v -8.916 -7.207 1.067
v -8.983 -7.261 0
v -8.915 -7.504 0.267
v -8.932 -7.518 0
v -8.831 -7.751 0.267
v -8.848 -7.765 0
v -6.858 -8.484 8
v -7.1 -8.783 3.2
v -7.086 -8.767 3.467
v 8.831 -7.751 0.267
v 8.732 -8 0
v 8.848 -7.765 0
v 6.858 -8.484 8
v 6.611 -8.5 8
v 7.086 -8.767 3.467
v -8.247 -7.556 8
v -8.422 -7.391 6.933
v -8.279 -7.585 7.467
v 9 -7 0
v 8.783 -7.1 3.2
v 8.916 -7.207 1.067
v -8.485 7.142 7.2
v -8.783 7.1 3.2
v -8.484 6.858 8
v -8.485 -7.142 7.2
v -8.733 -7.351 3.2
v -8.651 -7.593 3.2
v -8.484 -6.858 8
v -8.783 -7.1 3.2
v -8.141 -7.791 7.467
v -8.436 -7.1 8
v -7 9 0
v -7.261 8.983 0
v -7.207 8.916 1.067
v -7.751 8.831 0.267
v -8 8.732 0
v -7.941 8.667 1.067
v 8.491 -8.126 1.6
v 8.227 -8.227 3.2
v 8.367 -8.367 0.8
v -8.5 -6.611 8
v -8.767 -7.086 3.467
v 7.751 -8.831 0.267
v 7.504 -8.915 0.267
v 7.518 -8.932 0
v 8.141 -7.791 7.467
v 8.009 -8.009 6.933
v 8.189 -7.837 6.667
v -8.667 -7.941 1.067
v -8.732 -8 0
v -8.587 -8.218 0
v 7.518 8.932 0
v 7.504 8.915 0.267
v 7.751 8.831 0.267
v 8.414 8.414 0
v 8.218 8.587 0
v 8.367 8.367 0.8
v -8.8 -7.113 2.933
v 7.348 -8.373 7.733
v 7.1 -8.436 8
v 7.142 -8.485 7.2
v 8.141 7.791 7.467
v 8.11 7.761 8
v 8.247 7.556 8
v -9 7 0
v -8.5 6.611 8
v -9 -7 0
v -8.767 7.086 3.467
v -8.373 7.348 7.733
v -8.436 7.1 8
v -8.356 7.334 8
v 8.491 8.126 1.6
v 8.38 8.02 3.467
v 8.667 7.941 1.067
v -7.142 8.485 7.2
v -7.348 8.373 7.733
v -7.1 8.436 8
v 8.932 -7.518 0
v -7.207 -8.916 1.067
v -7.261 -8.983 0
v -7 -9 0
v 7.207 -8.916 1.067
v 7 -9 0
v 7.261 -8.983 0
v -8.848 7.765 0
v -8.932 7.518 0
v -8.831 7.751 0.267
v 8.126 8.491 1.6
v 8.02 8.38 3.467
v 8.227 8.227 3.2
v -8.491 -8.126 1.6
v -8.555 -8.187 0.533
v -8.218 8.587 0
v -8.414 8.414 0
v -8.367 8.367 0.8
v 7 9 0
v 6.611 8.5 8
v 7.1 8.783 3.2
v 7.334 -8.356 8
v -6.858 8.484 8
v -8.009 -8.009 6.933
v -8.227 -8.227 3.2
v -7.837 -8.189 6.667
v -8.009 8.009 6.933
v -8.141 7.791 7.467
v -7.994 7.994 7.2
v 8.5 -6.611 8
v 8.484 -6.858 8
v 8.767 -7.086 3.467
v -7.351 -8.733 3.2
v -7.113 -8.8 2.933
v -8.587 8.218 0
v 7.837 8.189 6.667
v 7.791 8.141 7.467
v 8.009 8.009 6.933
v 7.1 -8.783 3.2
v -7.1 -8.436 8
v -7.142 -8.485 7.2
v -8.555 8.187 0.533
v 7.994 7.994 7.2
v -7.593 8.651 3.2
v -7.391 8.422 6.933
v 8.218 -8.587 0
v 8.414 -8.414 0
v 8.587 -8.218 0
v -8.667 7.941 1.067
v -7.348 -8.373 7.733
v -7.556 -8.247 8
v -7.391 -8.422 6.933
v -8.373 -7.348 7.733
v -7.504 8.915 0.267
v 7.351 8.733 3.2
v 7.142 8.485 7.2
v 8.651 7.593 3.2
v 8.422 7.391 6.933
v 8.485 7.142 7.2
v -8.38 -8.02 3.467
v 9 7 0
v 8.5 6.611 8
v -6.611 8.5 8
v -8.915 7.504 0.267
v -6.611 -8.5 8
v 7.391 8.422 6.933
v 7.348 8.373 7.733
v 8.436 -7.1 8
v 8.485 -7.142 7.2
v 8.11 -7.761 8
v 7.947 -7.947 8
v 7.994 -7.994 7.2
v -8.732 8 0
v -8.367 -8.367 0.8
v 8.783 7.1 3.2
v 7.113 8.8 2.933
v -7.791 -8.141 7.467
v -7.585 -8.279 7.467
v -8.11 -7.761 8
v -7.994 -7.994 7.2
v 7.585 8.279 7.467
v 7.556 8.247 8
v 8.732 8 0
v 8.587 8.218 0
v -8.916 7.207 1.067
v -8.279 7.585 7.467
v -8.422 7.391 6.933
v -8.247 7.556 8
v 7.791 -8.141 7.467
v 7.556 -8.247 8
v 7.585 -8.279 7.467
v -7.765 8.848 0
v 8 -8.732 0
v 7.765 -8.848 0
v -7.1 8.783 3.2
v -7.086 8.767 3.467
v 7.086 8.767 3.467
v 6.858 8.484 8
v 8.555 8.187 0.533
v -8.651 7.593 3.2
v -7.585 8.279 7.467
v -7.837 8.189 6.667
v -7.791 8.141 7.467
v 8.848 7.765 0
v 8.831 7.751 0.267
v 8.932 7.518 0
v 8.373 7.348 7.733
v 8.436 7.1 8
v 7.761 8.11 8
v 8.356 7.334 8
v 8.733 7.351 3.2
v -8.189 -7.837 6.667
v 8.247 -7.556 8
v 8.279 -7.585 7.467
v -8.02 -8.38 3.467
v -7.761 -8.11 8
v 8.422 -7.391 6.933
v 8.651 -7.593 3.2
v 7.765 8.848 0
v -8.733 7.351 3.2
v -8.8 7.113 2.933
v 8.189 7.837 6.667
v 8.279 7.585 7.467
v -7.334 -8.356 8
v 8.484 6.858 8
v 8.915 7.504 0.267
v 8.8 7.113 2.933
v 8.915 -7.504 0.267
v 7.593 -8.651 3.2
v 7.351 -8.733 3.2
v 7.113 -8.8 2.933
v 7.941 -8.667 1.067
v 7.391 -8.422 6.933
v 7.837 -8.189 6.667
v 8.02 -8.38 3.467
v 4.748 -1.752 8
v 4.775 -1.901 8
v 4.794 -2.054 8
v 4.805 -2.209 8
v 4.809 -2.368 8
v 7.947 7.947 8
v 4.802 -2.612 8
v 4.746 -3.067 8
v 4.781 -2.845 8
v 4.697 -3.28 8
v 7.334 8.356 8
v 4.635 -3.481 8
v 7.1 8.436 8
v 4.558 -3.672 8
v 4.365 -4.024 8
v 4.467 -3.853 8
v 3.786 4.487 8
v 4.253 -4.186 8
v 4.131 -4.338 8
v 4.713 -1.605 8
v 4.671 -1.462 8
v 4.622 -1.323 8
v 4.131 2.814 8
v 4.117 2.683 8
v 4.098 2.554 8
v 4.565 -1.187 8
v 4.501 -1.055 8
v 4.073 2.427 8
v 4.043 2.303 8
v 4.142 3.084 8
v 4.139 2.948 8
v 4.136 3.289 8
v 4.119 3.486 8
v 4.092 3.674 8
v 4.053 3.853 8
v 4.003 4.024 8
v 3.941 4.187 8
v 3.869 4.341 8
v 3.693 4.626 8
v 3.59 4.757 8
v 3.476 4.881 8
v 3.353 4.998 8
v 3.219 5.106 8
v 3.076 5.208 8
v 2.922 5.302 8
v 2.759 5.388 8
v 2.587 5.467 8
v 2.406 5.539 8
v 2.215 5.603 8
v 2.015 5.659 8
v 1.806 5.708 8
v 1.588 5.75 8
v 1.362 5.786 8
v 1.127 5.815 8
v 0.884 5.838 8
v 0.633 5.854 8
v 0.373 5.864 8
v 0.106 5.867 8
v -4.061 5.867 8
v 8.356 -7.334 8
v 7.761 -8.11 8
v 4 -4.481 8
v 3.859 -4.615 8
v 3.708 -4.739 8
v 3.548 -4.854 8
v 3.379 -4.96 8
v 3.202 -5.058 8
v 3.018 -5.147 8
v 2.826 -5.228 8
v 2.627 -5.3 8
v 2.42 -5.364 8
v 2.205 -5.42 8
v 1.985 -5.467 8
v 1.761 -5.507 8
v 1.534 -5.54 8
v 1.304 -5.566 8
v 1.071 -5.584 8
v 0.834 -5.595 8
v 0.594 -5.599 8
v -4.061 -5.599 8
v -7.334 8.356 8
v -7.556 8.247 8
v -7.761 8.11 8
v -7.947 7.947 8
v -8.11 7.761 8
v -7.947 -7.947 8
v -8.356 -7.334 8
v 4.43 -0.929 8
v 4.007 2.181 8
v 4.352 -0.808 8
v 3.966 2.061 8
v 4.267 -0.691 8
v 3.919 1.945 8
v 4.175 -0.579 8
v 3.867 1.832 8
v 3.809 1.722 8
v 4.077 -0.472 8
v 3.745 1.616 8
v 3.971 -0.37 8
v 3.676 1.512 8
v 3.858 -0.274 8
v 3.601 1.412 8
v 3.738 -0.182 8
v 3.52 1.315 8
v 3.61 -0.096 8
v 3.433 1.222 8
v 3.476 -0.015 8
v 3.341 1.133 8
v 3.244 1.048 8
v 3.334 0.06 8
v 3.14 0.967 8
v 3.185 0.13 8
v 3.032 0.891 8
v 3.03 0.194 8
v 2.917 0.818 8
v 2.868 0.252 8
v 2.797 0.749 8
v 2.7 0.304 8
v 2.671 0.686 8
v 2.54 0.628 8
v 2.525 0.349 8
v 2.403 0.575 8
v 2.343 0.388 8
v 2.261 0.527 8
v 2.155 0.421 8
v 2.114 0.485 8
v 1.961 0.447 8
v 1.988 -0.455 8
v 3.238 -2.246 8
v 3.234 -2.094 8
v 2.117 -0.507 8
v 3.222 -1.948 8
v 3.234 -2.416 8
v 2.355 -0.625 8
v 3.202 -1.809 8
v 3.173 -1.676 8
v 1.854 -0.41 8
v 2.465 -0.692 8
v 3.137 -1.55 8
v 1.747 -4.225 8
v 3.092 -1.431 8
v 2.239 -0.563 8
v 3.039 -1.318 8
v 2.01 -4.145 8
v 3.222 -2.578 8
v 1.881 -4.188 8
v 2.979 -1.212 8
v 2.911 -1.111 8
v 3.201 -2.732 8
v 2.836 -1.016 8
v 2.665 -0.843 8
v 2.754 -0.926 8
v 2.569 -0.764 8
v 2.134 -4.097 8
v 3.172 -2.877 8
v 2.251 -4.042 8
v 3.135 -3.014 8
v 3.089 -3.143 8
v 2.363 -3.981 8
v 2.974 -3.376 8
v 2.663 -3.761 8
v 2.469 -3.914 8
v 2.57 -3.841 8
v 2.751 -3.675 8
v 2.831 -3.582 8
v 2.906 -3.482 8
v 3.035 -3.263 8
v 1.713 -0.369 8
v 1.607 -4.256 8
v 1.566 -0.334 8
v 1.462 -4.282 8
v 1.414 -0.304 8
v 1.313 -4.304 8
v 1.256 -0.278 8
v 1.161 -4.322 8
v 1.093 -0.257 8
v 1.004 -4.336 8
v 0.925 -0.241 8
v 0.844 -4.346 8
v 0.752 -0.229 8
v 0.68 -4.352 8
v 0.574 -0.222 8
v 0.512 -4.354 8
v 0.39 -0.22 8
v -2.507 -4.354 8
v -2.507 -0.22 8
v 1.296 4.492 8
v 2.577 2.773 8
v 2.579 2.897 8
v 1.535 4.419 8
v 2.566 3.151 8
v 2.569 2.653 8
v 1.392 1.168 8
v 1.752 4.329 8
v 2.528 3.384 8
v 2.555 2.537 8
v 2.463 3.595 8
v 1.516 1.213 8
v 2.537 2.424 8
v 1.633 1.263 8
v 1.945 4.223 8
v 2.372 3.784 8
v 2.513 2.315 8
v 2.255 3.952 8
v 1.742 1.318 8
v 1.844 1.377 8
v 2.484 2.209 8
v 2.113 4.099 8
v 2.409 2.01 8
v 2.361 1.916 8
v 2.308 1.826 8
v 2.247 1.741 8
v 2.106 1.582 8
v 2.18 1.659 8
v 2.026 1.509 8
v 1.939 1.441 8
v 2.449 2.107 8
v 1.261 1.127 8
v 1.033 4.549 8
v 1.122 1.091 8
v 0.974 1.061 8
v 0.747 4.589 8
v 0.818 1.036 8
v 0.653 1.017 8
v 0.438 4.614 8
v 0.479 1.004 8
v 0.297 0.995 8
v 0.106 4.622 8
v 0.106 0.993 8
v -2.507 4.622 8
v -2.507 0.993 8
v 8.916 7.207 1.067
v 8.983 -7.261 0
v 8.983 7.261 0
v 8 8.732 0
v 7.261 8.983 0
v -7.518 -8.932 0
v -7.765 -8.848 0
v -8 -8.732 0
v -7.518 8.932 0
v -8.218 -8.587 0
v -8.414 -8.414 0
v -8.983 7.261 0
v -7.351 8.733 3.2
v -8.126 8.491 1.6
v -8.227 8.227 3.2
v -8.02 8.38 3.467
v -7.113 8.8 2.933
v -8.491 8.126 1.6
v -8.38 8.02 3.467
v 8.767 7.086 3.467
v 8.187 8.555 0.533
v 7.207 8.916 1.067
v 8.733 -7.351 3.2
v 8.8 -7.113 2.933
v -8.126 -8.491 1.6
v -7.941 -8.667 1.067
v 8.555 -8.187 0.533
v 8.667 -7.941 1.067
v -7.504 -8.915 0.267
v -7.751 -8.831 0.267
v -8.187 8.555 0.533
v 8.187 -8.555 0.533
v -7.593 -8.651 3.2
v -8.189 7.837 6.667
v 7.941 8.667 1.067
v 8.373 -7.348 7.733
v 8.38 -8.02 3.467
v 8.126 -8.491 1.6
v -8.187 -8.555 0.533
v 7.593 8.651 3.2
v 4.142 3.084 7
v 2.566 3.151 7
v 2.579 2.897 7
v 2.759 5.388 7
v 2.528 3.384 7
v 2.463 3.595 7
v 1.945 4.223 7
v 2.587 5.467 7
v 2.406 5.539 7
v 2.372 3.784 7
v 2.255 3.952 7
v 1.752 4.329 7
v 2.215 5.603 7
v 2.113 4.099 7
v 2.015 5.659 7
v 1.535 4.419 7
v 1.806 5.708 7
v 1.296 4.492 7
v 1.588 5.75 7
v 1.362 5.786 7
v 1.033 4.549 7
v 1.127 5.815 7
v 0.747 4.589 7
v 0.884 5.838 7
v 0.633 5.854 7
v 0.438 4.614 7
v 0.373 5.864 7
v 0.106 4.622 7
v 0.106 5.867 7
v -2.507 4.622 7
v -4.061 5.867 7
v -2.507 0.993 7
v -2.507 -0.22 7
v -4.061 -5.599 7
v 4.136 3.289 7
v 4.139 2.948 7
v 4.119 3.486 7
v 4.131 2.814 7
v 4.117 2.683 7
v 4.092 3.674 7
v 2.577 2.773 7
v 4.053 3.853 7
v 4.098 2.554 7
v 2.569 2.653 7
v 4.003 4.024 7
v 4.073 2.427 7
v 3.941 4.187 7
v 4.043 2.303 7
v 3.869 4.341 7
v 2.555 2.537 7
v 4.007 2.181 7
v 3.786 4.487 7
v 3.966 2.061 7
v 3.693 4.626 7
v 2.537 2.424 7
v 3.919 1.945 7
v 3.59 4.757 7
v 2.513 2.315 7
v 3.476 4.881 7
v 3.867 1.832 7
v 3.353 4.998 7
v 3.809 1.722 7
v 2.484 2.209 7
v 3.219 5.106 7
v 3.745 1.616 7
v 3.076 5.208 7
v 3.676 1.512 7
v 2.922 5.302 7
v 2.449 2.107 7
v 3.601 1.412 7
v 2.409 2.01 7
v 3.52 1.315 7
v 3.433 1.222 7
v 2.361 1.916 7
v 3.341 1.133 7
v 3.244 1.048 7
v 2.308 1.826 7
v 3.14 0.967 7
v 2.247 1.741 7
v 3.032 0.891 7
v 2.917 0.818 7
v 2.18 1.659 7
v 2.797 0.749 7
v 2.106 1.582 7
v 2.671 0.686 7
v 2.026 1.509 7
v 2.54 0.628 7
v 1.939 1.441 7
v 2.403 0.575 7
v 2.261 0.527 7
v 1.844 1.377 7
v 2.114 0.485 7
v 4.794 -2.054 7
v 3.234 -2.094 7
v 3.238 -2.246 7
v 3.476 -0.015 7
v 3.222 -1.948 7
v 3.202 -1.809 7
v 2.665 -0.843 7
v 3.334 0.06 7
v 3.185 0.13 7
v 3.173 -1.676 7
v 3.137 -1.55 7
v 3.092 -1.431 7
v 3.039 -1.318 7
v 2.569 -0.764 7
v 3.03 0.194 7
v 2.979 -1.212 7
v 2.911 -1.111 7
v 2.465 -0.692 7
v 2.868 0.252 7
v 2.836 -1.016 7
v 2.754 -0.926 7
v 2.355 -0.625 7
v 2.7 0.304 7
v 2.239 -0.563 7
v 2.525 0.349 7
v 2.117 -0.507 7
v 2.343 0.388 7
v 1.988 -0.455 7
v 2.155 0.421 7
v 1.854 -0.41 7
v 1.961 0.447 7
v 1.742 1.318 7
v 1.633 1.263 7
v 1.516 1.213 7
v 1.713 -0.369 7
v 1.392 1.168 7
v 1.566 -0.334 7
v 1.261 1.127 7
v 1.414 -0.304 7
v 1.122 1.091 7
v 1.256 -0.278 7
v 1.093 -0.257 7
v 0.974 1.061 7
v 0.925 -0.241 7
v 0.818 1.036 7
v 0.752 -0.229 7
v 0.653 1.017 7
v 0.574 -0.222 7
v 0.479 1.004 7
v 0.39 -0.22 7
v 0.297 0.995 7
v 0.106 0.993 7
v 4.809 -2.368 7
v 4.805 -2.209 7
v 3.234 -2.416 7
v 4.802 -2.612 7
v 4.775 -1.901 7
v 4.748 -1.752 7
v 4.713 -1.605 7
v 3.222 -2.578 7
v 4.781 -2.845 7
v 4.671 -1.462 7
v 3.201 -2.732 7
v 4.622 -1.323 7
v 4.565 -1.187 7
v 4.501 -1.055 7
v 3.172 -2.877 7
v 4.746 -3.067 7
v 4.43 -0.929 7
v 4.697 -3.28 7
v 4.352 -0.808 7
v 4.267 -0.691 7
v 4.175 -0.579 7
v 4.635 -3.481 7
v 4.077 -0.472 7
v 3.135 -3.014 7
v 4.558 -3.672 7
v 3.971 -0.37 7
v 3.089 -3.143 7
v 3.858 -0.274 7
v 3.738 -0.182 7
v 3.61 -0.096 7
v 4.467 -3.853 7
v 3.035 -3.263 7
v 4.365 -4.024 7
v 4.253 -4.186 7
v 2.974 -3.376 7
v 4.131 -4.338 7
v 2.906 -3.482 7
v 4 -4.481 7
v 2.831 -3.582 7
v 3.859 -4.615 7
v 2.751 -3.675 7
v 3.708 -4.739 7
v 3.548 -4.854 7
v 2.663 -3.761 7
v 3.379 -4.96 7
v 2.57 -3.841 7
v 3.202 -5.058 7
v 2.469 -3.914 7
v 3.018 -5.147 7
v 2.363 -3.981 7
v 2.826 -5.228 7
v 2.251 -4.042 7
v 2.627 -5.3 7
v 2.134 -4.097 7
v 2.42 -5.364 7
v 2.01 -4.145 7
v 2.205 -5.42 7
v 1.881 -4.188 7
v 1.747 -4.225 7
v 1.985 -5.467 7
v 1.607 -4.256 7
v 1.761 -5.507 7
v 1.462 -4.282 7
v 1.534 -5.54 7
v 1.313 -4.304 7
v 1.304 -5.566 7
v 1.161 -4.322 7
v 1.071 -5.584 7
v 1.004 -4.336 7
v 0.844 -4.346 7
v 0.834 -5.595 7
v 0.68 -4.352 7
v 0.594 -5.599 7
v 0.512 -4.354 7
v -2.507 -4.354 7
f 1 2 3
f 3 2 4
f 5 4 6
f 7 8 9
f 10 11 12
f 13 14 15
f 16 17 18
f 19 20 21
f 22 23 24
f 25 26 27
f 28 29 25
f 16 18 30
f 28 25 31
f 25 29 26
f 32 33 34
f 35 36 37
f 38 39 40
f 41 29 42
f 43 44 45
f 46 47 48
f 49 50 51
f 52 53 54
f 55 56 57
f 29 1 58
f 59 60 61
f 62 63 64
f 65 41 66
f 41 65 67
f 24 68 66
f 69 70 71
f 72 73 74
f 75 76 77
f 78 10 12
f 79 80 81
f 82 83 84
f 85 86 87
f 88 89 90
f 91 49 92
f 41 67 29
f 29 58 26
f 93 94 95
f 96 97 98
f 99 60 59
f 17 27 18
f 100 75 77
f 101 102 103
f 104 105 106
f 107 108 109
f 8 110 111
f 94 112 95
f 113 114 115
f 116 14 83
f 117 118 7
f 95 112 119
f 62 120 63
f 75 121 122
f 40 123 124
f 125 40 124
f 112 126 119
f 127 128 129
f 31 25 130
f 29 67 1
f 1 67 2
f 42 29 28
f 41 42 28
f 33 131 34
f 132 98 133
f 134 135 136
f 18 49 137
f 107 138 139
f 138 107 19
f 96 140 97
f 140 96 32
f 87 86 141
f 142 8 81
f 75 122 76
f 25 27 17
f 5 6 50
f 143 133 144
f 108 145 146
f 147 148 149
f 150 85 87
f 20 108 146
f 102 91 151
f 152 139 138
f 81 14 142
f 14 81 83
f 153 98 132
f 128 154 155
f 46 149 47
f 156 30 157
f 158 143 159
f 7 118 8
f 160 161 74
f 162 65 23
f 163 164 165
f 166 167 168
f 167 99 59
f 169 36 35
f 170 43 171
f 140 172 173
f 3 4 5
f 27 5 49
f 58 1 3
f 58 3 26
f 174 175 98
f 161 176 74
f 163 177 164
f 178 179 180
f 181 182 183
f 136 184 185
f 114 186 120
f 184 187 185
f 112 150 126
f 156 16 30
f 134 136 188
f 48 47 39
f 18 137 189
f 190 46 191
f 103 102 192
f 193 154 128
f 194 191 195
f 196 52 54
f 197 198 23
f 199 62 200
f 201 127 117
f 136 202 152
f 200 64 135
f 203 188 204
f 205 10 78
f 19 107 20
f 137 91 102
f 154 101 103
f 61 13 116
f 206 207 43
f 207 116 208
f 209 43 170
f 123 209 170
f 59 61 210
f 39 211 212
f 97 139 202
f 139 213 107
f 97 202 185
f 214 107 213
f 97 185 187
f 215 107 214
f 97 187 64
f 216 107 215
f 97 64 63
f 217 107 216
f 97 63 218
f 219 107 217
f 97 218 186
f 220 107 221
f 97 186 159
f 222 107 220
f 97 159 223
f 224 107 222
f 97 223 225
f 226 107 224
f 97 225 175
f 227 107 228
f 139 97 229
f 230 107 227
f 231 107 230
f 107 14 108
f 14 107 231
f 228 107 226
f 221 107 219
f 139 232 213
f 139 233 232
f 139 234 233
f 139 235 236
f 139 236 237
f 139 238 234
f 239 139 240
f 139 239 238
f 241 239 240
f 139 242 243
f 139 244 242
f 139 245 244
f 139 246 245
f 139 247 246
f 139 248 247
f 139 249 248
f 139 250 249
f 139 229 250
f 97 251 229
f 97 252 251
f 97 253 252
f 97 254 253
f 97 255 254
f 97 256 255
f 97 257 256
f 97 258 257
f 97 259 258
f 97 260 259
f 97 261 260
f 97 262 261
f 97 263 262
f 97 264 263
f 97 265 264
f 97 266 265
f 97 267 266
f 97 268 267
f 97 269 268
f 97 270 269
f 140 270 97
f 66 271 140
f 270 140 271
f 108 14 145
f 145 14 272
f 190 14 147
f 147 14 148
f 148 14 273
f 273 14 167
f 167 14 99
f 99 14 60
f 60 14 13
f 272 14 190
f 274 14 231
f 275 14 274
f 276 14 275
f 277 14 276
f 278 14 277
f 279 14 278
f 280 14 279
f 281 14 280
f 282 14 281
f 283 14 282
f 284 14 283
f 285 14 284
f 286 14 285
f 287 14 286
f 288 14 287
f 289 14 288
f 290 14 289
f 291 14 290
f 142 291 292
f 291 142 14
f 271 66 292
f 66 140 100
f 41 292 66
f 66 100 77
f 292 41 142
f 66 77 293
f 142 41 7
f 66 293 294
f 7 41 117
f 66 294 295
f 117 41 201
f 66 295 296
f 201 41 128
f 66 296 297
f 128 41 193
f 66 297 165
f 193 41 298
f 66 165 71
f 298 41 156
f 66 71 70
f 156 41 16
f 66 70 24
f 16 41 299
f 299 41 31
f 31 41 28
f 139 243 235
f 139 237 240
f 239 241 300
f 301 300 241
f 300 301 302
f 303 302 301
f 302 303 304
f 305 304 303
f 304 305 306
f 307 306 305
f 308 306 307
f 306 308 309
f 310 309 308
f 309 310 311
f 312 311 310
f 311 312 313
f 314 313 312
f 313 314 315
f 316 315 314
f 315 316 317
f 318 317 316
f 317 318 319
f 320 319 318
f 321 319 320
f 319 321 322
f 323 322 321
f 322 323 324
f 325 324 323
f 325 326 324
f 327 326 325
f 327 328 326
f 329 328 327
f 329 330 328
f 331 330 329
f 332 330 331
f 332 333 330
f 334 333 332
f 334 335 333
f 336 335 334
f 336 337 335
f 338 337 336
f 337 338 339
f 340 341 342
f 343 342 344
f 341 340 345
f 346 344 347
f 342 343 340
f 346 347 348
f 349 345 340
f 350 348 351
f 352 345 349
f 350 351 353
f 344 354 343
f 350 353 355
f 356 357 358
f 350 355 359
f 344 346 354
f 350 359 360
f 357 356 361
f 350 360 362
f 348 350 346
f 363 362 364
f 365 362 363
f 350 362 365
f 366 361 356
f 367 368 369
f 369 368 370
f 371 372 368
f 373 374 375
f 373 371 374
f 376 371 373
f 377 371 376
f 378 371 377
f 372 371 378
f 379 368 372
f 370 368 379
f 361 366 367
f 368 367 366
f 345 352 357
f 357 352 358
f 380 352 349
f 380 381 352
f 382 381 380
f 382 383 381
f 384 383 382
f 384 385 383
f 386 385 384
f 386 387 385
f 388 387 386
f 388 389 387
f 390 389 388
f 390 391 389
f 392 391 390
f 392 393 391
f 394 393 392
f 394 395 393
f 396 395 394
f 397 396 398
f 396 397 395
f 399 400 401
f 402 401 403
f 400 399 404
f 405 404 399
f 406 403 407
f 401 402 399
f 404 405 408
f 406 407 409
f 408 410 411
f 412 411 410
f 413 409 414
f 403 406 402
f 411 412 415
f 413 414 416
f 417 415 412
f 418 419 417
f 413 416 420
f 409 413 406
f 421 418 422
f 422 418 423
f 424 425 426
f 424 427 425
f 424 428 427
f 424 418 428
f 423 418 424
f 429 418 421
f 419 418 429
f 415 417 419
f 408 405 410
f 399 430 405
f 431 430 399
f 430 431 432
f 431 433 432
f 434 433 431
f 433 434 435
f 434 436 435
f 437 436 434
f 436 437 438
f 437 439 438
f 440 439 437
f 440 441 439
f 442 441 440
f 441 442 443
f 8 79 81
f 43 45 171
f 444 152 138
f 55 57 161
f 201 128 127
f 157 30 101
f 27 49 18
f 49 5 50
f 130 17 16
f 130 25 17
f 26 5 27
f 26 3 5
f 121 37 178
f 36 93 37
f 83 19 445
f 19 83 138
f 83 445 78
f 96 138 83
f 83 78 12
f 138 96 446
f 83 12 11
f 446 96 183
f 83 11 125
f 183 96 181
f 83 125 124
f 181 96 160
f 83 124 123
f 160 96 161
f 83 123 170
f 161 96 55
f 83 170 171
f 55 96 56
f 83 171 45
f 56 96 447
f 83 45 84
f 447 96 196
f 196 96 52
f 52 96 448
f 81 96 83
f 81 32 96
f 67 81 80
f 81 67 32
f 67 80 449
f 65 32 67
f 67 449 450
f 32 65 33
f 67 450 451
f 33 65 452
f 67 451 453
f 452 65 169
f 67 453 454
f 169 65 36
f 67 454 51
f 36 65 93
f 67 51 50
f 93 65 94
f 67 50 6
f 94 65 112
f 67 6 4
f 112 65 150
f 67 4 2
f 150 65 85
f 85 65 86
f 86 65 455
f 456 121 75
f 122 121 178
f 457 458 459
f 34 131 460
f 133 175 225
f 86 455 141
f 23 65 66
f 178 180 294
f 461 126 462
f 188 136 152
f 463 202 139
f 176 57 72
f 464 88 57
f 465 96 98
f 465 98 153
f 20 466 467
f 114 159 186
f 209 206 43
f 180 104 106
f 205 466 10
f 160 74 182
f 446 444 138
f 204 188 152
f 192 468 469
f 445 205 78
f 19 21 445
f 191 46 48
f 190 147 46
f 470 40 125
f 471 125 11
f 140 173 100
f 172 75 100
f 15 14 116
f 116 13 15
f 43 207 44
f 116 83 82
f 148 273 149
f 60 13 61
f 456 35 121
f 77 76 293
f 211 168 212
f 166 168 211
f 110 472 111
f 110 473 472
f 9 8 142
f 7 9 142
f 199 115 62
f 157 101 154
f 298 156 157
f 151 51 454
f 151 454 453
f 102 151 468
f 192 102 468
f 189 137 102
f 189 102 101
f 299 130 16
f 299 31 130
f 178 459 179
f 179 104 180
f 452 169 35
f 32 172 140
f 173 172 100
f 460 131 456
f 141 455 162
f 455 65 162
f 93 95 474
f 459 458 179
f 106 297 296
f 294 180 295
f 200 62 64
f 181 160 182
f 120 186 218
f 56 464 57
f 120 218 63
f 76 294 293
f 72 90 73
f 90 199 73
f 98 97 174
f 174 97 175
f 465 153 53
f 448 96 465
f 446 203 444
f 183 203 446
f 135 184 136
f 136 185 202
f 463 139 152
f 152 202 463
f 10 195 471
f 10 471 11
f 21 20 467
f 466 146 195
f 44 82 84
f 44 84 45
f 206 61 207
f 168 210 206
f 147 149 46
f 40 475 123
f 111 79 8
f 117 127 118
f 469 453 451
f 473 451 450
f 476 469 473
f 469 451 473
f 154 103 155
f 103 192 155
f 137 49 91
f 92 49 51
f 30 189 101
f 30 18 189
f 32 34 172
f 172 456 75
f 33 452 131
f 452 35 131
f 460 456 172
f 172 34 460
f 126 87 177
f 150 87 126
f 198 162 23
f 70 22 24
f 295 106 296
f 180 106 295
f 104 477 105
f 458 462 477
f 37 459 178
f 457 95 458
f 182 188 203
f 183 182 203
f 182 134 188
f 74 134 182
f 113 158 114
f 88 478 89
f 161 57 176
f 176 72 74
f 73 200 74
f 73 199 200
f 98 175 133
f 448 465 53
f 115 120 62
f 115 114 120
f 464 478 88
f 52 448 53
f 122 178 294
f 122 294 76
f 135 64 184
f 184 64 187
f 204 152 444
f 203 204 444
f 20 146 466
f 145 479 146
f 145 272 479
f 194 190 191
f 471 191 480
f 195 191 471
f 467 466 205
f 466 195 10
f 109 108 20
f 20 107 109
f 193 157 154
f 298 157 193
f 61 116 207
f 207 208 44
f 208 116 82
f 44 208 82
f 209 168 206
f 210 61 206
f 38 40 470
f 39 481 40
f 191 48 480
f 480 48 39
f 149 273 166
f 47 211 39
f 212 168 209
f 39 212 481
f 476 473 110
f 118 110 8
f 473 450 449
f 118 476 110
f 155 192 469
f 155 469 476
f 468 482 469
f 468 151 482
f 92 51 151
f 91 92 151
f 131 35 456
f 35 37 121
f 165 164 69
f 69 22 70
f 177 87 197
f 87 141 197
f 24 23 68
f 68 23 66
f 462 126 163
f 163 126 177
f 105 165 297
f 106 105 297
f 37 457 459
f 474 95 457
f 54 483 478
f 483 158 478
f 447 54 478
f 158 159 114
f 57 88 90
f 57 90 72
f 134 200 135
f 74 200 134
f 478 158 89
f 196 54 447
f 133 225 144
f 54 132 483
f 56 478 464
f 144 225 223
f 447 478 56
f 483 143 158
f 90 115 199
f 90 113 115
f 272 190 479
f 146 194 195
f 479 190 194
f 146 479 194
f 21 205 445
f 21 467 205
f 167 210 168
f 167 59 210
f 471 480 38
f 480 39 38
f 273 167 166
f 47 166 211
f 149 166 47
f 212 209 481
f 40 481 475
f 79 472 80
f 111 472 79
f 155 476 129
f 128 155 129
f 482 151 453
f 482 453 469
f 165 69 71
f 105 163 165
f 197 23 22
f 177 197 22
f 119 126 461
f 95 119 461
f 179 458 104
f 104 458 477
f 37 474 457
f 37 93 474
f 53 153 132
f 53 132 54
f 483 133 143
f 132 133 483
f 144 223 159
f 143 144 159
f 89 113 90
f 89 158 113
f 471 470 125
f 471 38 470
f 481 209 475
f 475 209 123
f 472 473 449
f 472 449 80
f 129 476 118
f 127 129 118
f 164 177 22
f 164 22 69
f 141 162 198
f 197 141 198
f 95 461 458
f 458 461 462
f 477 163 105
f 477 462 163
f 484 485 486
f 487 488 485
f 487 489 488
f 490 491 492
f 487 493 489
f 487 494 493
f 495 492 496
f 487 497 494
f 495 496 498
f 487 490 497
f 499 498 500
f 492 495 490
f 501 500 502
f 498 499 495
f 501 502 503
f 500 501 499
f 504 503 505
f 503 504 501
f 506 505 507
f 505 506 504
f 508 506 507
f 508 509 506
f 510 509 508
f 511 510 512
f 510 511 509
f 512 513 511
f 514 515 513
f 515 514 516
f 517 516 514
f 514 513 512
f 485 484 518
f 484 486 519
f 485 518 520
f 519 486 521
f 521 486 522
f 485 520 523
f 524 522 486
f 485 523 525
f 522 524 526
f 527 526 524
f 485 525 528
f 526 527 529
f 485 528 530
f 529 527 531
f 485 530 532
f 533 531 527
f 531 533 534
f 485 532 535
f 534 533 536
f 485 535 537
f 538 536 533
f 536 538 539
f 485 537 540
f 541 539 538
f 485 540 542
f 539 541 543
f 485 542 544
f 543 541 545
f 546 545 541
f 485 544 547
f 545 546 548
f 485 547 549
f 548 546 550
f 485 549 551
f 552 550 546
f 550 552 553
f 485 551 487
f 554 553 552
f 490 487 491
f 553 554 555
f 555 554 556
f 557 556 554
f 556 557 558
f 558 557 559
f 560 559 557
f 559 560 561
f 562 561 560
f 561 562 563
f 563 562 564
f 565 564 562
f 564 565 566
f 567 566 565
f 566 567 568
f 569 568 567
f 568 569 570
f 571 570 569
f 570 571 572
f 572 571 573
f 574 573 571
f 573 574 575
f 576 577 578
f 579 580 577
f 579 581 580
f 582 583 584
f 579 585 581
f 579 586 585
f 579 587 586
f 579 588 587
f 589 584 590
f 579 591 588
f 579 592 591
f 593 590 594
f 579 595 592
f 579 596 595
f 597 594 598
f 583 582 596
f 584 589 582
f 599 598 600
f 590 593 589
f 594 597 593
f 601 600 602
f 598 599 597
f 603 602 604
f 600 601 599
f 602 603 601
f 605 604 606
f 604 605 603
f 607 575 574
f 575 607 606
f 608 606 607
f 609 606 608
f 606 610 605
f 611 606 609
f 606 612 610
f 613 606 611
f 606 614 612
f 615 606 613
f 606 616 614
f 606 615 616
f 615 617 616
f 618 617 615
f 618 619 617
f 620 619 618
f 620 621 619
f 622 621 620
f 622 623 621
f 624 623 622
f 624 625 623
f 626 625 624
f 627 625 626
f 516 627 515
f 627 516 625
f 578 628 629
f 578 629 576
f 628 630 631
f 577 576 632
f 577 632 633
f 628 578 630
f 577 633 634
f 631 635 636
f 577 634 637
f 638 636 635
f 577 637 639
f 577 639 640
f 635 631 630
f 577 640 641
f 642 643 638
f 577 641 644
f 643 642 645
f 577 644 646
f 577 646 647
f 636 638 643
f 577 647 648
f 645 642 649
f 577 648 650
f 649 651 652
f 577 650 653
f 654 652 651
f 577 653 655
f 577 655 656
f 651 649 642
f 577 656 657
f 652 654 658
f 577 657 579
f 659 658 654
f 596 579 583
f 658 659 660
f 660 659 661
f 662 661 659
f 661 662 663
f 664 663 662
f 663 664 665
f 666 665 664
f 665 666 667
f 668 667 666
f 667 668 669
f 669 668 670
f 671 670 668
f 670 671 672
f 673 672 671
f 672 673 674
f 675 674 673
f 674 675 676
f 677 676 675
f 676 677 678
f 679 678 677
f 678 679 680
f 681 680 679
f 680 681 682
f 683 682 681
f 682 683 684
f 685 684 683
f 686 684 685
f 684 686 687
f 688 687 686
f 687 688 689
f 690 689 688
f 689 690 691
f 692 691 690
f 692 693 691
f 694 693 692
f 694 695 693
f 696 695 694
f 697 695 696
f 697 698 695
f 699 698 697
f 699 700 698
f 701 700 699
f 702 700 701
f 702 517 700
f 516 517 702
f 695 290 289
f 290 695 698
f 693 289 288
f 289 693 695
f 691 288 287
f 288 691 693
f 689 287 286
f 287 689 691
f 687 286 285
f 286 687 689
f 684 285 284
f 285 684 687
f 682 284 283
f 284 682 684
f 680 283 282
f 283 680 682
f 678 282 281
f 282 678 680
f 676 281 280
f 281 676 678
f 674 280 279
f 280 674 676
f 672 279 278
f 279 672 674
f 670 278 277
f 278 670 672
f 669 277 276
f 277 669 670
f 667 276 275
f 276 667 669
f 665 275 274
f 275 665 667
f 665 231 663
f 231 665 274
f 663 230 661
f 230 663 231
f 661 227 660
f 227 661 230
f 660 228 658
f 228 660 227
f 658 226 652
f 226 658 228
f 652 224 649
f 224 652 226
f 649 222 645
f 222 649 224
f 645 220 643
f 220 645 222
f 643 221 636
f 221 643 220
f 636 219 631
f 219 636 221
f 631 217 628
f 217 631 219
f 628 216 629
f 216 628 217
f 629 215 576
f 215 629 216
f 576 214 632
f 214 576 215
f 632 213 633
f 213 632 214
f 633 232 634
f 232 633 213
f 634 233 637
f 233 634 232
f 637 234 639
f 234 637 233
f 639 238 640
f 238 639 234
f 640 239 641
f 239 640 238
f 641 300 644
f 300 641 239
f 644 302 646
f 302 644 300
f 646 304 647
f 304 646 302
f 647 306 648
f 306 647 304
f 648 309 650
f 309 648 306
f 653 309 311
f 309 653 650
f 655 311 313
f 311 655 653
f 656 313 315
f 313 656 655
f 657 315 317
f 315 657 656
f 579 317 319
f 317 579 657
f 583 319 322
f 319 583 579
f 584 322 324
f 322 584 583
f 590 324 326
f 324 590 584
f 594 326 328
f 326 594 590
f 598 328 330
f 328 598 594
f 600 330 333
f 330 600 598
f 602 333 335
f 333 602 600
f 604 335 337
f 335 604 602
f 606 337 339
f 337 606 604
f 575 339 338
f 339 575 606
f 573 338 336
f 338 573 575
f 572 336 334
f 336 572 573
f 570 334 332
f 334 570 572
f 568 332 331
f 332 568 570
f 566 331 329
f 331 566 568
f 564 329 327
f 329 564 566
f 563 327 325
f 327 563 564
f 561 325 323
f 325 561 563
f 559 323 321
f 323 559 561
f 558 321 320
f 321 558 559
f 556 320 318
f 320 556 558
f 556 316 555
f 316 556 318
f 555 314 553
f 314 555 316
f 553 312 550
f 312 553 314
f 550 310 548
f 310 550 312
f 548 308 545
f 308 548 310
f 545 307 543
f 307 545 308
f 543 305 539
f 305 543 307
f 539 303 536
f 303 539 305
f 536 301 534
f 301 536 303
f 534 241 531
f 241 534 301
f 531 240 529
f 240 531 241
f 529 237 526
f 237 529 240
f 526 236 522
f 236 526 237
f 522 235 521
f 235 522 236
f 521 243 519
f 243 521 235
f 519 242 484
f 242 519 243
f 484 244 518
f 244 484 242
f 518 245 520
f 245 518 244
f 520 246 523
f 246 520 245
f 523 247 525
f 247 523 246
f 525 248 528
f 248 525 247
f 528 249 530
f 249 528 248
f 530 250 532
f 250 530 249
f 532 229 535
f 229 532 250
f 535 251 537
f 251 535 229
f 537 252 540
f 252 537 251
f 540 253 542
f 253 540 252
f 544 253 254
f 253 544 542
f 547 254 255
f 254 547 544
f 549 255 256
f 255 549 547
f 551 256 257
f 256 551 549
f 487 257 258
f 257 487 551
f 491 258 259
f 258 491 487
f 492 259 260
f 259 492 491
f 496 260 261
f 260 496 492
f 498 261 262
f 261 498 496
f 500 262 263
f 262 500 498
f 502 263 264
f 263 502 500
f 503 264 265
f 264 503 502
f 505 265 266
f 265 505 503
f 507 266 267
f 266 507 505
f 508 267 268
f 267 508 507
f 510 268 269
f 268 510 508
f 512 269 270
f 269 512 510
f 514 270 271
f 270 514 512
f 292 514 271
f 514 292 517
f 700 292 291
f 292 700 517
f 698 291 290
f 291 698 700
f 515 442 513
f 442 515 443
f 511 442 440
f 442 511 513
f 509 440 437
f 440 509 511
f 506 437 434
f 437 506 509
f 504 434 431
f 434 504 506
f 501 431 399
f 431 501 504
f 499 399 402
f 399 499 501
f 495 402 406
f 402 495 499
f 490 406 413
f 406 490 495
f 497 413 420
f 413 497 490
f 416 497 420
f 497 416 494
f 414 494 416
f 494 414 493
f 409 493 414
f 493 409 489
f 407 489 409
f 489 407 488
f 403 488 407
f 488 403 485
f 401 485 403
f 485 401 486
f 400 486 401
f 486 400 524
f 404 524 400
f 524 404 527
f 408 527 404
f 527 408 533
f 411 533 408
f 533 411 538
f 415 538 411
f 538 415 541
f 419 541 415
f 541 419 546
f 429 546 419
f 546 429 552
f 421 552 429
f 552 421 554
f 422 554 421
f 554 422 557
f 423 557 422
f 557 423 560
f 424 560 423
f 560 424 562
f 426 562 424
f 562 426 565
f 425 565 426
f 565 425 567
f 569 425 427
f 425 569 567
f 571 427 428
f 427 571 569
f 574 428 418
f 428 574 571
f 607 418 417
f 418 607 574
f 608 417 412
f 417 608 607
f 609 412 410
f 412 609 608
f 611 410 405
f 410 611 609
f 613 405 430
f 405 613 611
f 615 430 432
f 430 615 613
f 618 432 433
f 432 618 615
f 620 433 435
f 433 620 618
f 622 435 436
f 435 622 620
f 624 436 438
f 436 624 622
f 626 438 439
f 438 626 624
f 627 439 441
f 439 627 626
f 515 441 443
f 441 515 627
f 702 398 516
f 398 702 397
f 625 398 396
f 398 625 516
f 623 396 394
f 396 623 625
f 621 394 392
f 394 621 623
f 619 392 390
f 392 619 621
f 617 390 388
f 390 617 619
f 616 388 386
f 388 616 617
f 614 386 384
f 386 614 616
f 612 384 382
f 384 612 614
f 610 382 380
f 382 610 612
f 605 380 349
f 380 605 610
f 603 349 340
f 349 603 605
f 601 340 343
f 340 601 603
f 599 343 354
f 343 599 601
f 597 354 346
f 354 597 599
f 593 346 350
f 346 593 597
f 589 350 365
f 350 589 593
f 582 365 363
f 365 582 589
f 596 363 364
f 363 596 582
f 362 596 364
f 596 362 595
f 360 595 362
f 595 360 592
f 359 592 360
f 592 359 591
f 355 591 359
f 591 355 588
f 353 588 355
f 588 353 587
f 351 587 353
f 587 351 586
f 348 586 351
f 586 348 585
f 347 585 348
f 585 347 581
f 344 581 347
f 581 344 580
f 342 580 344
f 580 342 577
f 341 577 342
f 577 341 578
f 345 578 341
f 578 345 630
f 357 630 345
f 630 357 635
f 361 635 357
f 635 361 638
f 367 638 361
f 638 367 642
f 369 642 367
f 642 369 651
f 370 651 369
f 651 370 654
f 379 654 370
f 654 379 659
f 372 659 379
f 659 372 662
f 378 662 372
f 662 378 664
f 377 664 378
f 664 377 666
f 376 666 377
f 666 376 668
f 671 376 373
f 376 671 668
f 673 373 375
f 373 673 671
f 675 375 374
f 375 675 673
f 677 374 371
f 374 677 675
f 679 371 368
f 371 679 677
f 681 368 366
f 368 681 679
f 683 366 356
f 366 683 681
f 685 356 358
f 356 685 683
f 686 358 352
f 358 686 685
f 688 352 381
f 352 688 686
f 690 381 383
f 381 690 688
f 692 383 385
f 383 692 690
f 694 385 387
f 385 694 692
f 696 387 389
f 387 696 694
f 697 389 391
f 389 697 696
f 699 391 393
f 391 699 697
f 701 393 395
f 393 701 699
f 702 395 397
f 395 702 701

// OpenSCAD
// 放样：底部 18mm 圆角正方形 → 顶部 17mm 正方形，高度 8mm
// Z 轴方向四条边带 2mm 圆角
$fn = 48;

module rounded_square(size, r) {
    s = size / 2 - r;
    hull() {
        translate([ s,  s]) circle(r);
        translate([-s,  s]) circle(r);
        translate([ s, -s]) circle(r);
        translate([-s, -s]) circle(r);
    }
}

difference() {
    linear_extrude(height = 8, scale = 17 / 18, slices = 30, convexity = 10)
        rounded_square(18, 2);

    // 顶部居中刻字母 'A'，1mm 深
    translate([0, 0, 7])
        linear_extrude(height = 1, convexity = 4)
            text("B", size = 12, halign = "center", valign = "center");
}
